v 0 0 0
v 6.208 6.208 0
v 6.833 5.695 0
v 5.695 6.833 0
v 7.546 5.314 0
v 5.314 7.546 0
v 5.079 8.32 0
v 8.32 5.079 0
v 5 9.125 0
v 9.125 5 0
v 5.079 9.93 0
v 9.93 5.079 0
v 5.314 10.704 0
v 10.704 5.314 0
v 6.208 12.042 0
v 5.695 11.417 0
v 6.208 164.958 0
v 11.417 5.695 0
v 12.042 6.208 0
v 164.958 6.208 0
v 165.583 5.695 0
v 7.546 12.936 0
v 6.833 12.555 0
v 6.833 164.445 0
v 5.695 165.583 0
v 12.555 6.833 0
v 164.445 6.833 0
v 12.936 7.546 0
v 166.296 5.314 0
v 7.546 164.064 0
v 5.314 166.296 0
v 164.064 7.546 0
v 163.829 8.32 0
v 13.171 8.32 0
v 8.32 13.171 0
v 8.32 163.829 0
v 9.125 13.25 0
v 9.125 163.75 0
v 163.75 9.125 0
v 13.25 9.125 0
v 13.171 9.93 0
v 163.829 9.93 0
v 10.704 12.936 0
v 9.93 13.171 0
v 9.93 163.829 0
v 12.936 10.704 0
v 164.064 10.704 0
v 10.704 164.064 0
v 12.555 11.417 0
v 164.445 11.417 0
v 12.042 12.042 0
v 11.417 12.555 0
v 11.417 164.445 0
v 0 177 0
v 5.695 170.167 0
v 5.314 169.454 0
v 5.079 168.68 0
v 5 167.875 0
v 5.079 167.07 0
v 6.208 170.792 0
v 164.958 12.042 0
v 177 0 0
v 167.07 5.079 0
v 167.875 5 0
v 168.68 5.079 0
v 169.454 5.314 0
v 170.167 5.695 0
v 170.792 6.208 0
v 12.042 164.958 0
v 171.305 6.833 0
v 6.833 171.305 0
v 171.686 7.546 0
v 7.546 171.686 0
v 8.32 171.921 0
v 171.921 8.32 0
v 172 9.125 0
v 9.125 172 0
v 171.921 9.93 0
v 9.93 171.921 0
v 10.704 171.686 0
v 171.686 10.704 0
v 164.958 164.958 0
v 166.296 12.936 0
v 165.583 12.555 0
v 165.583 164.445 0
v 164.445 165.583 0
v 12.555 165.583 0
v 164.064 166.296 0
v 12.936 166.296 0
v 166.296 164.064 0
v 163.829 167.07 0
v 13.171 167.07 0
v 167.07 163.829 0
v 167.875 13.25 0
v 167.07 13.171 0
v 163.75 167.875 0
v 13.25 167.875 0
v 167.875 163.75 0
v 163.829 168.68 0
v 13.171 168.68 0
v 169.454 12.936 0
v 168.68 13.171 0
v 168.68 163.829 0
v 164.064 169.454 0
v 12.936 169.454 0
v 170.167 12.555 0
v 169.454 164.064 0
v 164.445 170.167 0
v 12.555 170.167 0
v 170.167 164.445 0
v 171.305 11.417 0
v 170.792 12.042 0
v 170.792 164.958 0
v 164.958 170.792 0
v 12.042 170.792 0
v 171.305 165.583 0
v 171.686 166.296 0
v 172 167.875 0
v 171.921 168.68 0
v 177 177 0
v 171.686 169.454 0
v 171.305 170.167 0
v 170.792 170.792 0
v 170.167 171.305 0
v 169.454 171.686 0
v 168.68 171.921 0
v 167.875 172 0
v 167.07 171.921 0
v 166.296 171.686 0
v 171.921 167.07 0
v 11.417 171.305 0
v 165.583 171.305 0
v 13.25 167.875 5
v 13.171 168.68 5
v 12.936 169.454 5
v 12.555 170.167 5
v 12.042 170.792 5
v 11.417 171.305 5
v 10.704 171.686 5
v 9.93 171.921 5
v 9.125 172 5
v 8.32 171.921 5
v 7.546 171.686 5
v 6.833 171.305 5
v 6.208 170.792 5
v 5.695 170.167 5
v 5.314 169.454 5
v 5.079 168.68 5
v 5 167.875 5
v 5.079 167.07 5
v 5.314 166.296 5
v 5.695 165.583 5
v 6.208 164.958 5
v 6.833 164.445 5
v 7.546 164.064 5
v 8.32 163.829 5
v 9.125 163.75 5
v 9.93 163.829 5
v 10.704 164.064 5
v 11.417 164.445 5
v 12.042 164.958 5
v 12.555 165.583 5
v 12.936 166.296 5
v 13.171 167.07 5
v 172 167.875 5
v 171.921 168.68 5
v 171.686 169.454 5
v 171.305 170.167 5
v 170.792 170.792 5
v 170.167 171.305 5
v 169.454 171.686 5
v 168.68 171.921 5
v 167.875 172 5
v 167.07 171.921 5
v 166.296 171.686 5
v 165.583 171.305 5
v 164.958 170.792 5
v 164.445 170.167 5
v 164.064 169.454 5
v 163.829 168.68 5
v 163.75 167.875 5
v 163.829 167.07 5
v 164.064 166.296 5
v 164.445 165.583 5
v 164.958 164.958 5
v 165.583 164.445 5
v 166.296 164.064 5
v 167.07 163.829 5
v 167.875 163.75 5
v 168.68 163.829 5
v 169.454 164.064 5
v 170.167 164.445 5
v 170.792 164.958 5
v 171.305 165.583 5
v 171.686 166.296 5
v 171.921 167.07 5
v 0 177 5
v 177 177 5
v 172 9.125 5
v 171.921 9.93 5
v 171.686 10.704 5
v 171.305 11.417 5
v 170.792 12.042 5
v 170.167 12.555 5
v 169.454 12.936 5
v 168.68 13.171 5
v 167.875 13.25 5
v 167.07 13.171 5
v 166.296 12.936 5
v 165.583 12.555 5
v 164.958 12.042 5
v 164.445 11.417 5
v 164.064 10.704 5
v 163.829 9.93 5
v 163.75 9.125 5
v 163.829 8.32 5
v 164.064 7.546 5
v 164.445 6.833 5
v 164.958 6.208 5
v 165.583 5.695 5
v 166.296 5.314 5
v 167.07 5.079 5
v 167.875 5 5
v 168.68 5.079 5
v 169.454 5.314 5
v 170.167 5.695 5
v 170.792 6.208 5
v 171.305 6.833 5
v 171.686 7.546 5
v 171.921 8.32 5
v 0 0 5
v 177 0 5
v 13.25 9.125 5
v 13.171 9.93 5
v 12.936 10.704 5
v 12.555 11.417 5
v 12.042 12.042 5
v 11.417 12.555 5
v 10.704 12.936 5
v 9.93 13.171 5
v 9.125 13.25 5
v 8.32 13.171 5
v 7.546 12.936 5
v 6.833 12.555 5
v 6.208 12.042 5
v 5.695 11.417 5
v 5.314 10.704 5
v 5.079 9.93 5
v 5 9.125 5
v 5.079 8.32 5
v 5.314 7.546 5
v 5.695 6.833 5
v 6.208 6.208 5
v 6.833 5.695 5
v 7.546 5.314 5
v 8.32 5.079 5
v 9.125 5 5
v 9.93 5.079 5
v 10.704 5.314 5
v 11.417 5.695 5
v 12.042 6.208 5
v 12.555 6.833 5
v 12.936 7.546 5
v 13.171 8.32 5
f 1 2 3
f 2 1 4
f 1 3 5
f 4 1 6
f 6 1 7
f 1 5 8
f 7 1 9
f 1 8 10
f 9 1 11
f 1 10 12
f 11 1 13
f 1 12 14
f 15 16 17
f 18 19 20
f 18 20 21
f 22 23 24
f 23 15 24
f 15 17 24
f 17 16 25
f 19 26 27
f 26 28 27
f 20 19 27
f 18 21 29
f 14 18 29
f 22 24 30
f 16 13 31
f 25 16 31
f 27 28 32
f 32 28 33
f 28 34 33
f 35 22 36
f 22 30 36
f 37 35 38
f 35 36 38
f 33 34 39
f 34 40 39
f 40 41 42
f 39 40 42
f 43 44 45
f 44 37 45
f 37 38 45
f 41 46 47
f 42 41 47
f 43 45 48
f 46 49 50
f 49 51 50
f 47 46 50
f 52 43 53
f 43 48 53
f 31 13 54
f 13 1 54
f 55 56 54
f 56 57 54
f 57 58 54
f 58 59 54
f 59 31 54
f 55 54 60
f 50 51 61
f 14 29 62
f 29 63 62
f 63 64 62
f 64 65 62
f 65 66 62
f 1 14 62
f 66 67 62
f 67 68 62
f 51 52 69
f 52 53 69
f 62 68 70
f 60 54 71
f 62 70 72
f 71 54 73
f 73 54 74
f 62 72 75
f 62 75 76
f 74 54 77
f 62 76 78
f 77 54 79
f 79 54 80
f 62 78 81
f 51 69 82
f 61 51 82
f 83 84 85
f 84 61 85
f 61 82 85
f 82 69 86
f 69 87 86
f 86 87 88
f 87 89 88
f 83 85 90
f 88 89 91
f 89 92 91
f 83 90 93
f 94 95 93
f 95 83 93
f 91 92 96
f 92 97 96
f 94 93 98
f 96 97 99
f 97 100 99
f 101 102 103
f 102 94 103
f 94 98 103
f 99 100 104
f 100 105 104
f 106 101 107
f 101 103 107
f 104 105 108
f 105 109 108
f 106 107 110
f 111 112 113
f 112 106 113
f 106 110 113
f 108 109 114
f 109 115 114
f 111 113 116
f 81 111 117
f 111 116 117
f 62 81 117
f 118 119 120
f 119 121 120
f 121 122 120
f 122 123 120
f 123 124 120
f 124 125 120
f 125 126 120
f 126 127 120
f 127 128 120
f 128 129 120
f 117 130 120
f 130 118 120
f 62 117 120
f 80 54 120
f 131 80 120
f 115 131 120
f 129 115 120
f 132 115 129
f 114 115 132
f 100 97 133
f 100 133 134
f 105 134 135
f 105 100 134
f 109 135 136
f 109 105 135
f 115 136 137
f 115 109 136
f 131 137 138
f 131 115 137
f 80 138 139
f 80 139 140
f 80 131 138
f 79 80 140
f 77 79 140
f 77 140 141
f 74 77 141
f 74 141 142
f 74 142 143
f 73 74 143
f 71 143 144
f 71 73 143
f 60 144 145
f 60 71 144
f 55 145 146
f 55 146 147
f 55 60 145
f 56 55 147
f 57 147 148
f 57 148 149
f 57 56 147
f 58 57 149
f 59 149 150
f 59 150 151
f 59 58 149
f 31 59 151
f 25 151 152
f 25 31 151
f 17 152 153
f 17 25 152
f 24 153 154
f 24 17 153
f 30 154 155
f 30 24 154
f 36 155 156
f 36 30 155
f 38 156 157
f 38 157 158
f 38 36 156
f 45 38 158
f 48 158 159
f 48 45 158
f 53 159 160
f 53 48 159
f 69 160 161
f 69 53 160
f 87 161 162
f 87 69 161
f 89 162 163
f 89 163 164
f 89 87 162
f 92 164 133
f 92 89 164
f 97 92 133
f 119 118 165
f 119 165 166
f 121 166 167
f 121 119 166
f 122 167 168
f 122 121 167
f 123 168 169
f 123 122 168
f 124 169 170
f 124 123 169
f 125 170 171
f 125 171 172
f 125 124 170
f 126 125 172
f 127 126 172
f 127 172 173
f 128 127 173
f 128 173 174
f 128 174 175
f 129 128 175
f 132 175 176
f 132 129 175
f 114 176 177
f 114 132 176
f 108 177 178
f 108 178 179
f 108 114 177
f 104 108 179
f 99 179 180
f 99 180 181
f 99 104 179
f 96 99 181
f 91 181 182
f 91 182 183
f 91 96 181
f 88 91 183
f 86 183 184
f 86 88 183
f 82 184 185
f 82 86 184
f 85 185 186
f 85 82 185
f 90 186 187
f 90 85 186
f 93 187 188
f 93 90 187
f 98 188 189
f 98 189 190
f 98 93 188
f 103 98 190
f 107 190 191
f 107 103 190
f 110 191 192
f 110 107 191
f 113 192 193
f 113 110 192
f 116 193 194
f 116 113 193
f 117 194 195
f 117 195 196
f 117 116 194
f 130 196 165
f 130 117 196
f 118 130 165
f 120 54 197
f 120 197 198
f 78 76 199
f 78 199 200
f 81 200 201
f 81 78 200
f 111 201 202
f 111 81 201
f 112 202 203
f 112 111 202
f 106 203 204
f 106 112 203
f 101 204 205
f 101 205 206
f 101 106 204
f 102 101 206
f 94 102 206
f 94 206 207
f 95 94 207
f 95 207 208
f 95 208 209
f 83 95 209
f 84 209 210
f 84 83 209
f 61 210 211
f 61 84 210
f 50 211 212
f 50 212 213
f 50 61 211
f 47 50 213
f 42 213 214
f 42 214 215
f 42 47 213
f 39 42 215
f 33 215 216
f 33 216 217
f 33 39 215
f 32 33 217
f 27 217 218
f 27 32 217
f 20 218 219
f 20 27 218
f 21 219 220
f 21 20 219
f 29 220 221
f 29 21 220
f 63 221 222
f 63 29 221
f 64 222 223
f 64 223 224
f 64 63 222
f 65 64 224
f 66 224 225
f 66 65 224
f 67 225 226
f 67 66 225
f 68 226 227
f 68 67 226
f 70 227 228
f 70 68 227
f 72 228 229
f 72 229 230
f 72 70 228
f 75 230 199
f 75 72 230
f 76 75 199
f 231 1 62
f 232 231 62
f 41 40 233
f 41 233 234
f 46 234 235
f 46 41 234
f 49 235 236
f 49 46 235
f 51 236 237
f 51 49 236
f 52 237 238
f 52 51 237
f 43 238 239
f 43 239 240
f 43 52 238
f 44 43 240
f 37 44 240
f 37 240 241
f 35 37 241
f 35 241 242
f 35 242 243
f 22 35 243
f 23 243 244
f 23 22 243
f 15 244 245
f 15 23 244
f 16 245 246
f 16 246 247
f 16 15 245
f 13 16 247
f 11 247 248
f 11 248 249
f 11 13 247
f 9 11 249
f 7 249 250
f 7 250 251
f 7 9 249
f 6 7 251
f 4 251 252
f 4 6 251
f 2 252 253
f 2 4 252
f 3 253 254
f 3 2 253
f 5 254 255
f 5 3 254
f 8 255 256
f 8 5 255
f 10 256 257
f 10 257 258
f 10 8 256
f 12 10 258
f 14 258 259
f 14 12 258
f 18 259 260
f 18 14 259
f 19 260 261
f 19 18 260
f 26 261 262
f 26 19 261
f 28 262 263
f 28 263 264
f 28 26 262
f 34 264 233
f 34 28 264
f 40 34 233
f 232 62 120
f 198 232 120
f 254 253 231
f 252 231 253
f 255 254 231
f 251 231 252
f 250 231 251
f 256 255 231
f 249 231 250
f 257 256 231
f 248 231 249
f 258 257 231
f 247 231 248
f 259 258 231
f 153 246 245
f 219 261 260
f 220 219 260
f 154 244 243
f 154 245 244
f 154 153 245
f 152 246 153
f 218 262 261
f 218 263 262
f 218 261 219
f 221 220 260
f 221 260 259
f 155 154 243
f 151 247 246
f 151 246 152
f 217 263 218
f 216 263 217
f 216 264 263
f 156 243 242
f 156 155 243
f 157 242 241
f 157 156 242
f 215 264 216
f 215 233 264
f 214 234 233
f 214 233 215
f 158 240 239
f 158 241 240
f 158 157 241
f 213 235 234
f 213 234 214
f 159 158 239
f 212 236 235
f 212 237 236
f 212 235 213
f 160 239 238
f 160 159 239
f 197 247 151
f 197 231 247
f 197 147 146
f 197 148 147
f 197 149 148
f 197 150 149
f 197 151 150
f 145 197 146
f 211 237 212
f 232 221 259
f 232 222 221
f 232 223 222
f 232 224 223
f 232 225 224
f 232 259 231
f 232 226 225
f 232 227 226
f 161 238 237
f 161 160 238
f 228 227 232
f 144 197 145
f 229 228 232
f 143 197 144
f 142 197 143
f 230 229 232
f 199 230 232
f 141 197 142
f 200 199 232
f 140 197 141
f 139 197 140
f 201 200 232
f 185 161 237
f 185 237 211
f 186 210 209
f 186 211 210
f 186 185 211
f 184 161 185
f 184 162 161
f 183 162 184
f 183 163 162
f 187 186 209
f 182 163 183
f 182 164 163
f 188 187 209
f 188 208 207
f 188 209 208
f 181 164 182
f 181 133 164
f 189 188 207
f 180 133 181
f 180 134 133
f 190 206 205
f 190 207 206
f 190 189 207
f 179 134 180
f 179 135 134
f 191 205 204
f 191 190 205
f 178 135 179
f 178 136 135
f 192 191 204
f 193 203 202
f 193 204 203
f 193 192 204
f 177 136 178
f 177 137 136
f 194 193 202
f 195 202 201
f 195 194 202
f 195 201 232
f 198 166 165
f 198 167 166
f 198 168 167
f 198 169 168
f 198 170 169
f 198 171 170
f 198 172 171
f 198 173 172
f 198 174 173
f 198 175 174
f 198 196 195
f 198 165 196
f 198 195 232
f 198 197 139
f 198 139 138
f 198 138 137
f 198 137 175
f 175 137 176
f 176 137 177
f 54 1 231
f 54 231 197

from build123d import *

# Parameters (mm, degrees)
SKETCH1_W           = 177
SKETCH1_H           = 177
SKETCH1_R           = 2.5
SKETCH1_R_2         = 4.125
BOSS_EXTRUDE1_DEPTH = 5


with BuildPart() as part:
    # Sketch1 → Boss-Extrude1 (new body)
    # profile 1 of 6: a face of its own
    with BuildSketch(Plane.XY):
        with Locations((88.5, 88.5)):
            Rectangle(SKETCH1_W, SKETCH1_H)
        with Locations((88.5, 88.5)):
            Circle(SKETCH1_R, mode=Mode.SUBTRACT)
        Polygon((163.645909278, 1.8), (159.416818556, 9.125), (163.645909278, 16.45), (172.104090722, 16.45), (176.333181444, 9.125), (172.104090722, 1.8), align=None, mode=Mode.SUBTRACT)
        Polygon((13.354090722, 1.8), (17.583181444, 9.125), (13.354090722, 16.45), (4.895909278, 16.45), (0.666818556, 9.125), (4.895909278, 1.8), align=None, mode=Mode.SUBTRACT)
        Polygon((163.645909278, 160.55), (172.104090722, 160.55), (176.333181444, 167.875), (172.104090722, 175.2), (163.645909278, 175.2), (159.416818556, 167.875), align=None, mode=Mode.SUBTRACT)
        Polygon((17.583181444, 167.875), (13.354090722, 160.55), (4.895909278, 160.55), (0.666818556, 167.875), (4.895909278, 175.2), (13.354090722, 175.2), align=None, mode=Mode.SUBTRACT)
    # profile 2 of 6: a face of its own
    with BuildSketch(Plane.XY):
        Polygon((13.354090722, 160.55), (4.895909278, 160.55), (0.666818556, 167.875), (4.895909278, 175.2), (13.354090722, 175.2), (17.583181444, 167.875), align=None)
        with Locations((9.125, 167.875)):
            Circle(SKETCH1_R_2, mode=Mode.SUBTRACT)
    # profile 3 of 6: a face of its own
    with BuildSketch(Plane.XY):
        Polygon((4.895909278, 1.8), (13.354090722, 1.8), (17.583181444, 9.125), (13.354090722, 16.45), (4.895909278, 16.45), (0.666818556, 9.125), align=None)
        with Locations((9.125, 9.125)):
            Circle(SKETCH1_R_2, mode=Mode.SUBTRACT)
    # profile 4 of 6: a face of its own
    with BuildSketch(Plane.XY):
        Polygon((159.416818556, 9.125), (163.645909278, 16.45), (172.104090722, 16.45), (176.333181444, 9.125), (172.104090722, 1.8), (163.645909278, 1.8), align=None)
        with Locations((167.875, 9.125)):
            Circle(SKETCH1_R_2, mode=Mode.SUBTRACT)
    # profile 5 of 6: a face of its own
    with BuildSketch(Plane.XY):
        Polygon((159.416818556, 167.875), (163.645909278, 160.55), (172.104090722, 160.55), (176.333181444, 167.875), (172.104090722, 175.2), (163.645909278, 175.2), align=None)
        with Locations((167.875, 167.875)):
            Circle(SKETCH1_R_2, mode=Mode.SUBTRACT)
    # profile 6 of 6: a face of its own
    with BuildSketch(Plane.XY):
        with Locations((88.5, 88.5)):
            Circle(SKETCH1_R)
    extrude(amount=BOSS_EXTRUDE1_DEPTH)


solid = part.part
